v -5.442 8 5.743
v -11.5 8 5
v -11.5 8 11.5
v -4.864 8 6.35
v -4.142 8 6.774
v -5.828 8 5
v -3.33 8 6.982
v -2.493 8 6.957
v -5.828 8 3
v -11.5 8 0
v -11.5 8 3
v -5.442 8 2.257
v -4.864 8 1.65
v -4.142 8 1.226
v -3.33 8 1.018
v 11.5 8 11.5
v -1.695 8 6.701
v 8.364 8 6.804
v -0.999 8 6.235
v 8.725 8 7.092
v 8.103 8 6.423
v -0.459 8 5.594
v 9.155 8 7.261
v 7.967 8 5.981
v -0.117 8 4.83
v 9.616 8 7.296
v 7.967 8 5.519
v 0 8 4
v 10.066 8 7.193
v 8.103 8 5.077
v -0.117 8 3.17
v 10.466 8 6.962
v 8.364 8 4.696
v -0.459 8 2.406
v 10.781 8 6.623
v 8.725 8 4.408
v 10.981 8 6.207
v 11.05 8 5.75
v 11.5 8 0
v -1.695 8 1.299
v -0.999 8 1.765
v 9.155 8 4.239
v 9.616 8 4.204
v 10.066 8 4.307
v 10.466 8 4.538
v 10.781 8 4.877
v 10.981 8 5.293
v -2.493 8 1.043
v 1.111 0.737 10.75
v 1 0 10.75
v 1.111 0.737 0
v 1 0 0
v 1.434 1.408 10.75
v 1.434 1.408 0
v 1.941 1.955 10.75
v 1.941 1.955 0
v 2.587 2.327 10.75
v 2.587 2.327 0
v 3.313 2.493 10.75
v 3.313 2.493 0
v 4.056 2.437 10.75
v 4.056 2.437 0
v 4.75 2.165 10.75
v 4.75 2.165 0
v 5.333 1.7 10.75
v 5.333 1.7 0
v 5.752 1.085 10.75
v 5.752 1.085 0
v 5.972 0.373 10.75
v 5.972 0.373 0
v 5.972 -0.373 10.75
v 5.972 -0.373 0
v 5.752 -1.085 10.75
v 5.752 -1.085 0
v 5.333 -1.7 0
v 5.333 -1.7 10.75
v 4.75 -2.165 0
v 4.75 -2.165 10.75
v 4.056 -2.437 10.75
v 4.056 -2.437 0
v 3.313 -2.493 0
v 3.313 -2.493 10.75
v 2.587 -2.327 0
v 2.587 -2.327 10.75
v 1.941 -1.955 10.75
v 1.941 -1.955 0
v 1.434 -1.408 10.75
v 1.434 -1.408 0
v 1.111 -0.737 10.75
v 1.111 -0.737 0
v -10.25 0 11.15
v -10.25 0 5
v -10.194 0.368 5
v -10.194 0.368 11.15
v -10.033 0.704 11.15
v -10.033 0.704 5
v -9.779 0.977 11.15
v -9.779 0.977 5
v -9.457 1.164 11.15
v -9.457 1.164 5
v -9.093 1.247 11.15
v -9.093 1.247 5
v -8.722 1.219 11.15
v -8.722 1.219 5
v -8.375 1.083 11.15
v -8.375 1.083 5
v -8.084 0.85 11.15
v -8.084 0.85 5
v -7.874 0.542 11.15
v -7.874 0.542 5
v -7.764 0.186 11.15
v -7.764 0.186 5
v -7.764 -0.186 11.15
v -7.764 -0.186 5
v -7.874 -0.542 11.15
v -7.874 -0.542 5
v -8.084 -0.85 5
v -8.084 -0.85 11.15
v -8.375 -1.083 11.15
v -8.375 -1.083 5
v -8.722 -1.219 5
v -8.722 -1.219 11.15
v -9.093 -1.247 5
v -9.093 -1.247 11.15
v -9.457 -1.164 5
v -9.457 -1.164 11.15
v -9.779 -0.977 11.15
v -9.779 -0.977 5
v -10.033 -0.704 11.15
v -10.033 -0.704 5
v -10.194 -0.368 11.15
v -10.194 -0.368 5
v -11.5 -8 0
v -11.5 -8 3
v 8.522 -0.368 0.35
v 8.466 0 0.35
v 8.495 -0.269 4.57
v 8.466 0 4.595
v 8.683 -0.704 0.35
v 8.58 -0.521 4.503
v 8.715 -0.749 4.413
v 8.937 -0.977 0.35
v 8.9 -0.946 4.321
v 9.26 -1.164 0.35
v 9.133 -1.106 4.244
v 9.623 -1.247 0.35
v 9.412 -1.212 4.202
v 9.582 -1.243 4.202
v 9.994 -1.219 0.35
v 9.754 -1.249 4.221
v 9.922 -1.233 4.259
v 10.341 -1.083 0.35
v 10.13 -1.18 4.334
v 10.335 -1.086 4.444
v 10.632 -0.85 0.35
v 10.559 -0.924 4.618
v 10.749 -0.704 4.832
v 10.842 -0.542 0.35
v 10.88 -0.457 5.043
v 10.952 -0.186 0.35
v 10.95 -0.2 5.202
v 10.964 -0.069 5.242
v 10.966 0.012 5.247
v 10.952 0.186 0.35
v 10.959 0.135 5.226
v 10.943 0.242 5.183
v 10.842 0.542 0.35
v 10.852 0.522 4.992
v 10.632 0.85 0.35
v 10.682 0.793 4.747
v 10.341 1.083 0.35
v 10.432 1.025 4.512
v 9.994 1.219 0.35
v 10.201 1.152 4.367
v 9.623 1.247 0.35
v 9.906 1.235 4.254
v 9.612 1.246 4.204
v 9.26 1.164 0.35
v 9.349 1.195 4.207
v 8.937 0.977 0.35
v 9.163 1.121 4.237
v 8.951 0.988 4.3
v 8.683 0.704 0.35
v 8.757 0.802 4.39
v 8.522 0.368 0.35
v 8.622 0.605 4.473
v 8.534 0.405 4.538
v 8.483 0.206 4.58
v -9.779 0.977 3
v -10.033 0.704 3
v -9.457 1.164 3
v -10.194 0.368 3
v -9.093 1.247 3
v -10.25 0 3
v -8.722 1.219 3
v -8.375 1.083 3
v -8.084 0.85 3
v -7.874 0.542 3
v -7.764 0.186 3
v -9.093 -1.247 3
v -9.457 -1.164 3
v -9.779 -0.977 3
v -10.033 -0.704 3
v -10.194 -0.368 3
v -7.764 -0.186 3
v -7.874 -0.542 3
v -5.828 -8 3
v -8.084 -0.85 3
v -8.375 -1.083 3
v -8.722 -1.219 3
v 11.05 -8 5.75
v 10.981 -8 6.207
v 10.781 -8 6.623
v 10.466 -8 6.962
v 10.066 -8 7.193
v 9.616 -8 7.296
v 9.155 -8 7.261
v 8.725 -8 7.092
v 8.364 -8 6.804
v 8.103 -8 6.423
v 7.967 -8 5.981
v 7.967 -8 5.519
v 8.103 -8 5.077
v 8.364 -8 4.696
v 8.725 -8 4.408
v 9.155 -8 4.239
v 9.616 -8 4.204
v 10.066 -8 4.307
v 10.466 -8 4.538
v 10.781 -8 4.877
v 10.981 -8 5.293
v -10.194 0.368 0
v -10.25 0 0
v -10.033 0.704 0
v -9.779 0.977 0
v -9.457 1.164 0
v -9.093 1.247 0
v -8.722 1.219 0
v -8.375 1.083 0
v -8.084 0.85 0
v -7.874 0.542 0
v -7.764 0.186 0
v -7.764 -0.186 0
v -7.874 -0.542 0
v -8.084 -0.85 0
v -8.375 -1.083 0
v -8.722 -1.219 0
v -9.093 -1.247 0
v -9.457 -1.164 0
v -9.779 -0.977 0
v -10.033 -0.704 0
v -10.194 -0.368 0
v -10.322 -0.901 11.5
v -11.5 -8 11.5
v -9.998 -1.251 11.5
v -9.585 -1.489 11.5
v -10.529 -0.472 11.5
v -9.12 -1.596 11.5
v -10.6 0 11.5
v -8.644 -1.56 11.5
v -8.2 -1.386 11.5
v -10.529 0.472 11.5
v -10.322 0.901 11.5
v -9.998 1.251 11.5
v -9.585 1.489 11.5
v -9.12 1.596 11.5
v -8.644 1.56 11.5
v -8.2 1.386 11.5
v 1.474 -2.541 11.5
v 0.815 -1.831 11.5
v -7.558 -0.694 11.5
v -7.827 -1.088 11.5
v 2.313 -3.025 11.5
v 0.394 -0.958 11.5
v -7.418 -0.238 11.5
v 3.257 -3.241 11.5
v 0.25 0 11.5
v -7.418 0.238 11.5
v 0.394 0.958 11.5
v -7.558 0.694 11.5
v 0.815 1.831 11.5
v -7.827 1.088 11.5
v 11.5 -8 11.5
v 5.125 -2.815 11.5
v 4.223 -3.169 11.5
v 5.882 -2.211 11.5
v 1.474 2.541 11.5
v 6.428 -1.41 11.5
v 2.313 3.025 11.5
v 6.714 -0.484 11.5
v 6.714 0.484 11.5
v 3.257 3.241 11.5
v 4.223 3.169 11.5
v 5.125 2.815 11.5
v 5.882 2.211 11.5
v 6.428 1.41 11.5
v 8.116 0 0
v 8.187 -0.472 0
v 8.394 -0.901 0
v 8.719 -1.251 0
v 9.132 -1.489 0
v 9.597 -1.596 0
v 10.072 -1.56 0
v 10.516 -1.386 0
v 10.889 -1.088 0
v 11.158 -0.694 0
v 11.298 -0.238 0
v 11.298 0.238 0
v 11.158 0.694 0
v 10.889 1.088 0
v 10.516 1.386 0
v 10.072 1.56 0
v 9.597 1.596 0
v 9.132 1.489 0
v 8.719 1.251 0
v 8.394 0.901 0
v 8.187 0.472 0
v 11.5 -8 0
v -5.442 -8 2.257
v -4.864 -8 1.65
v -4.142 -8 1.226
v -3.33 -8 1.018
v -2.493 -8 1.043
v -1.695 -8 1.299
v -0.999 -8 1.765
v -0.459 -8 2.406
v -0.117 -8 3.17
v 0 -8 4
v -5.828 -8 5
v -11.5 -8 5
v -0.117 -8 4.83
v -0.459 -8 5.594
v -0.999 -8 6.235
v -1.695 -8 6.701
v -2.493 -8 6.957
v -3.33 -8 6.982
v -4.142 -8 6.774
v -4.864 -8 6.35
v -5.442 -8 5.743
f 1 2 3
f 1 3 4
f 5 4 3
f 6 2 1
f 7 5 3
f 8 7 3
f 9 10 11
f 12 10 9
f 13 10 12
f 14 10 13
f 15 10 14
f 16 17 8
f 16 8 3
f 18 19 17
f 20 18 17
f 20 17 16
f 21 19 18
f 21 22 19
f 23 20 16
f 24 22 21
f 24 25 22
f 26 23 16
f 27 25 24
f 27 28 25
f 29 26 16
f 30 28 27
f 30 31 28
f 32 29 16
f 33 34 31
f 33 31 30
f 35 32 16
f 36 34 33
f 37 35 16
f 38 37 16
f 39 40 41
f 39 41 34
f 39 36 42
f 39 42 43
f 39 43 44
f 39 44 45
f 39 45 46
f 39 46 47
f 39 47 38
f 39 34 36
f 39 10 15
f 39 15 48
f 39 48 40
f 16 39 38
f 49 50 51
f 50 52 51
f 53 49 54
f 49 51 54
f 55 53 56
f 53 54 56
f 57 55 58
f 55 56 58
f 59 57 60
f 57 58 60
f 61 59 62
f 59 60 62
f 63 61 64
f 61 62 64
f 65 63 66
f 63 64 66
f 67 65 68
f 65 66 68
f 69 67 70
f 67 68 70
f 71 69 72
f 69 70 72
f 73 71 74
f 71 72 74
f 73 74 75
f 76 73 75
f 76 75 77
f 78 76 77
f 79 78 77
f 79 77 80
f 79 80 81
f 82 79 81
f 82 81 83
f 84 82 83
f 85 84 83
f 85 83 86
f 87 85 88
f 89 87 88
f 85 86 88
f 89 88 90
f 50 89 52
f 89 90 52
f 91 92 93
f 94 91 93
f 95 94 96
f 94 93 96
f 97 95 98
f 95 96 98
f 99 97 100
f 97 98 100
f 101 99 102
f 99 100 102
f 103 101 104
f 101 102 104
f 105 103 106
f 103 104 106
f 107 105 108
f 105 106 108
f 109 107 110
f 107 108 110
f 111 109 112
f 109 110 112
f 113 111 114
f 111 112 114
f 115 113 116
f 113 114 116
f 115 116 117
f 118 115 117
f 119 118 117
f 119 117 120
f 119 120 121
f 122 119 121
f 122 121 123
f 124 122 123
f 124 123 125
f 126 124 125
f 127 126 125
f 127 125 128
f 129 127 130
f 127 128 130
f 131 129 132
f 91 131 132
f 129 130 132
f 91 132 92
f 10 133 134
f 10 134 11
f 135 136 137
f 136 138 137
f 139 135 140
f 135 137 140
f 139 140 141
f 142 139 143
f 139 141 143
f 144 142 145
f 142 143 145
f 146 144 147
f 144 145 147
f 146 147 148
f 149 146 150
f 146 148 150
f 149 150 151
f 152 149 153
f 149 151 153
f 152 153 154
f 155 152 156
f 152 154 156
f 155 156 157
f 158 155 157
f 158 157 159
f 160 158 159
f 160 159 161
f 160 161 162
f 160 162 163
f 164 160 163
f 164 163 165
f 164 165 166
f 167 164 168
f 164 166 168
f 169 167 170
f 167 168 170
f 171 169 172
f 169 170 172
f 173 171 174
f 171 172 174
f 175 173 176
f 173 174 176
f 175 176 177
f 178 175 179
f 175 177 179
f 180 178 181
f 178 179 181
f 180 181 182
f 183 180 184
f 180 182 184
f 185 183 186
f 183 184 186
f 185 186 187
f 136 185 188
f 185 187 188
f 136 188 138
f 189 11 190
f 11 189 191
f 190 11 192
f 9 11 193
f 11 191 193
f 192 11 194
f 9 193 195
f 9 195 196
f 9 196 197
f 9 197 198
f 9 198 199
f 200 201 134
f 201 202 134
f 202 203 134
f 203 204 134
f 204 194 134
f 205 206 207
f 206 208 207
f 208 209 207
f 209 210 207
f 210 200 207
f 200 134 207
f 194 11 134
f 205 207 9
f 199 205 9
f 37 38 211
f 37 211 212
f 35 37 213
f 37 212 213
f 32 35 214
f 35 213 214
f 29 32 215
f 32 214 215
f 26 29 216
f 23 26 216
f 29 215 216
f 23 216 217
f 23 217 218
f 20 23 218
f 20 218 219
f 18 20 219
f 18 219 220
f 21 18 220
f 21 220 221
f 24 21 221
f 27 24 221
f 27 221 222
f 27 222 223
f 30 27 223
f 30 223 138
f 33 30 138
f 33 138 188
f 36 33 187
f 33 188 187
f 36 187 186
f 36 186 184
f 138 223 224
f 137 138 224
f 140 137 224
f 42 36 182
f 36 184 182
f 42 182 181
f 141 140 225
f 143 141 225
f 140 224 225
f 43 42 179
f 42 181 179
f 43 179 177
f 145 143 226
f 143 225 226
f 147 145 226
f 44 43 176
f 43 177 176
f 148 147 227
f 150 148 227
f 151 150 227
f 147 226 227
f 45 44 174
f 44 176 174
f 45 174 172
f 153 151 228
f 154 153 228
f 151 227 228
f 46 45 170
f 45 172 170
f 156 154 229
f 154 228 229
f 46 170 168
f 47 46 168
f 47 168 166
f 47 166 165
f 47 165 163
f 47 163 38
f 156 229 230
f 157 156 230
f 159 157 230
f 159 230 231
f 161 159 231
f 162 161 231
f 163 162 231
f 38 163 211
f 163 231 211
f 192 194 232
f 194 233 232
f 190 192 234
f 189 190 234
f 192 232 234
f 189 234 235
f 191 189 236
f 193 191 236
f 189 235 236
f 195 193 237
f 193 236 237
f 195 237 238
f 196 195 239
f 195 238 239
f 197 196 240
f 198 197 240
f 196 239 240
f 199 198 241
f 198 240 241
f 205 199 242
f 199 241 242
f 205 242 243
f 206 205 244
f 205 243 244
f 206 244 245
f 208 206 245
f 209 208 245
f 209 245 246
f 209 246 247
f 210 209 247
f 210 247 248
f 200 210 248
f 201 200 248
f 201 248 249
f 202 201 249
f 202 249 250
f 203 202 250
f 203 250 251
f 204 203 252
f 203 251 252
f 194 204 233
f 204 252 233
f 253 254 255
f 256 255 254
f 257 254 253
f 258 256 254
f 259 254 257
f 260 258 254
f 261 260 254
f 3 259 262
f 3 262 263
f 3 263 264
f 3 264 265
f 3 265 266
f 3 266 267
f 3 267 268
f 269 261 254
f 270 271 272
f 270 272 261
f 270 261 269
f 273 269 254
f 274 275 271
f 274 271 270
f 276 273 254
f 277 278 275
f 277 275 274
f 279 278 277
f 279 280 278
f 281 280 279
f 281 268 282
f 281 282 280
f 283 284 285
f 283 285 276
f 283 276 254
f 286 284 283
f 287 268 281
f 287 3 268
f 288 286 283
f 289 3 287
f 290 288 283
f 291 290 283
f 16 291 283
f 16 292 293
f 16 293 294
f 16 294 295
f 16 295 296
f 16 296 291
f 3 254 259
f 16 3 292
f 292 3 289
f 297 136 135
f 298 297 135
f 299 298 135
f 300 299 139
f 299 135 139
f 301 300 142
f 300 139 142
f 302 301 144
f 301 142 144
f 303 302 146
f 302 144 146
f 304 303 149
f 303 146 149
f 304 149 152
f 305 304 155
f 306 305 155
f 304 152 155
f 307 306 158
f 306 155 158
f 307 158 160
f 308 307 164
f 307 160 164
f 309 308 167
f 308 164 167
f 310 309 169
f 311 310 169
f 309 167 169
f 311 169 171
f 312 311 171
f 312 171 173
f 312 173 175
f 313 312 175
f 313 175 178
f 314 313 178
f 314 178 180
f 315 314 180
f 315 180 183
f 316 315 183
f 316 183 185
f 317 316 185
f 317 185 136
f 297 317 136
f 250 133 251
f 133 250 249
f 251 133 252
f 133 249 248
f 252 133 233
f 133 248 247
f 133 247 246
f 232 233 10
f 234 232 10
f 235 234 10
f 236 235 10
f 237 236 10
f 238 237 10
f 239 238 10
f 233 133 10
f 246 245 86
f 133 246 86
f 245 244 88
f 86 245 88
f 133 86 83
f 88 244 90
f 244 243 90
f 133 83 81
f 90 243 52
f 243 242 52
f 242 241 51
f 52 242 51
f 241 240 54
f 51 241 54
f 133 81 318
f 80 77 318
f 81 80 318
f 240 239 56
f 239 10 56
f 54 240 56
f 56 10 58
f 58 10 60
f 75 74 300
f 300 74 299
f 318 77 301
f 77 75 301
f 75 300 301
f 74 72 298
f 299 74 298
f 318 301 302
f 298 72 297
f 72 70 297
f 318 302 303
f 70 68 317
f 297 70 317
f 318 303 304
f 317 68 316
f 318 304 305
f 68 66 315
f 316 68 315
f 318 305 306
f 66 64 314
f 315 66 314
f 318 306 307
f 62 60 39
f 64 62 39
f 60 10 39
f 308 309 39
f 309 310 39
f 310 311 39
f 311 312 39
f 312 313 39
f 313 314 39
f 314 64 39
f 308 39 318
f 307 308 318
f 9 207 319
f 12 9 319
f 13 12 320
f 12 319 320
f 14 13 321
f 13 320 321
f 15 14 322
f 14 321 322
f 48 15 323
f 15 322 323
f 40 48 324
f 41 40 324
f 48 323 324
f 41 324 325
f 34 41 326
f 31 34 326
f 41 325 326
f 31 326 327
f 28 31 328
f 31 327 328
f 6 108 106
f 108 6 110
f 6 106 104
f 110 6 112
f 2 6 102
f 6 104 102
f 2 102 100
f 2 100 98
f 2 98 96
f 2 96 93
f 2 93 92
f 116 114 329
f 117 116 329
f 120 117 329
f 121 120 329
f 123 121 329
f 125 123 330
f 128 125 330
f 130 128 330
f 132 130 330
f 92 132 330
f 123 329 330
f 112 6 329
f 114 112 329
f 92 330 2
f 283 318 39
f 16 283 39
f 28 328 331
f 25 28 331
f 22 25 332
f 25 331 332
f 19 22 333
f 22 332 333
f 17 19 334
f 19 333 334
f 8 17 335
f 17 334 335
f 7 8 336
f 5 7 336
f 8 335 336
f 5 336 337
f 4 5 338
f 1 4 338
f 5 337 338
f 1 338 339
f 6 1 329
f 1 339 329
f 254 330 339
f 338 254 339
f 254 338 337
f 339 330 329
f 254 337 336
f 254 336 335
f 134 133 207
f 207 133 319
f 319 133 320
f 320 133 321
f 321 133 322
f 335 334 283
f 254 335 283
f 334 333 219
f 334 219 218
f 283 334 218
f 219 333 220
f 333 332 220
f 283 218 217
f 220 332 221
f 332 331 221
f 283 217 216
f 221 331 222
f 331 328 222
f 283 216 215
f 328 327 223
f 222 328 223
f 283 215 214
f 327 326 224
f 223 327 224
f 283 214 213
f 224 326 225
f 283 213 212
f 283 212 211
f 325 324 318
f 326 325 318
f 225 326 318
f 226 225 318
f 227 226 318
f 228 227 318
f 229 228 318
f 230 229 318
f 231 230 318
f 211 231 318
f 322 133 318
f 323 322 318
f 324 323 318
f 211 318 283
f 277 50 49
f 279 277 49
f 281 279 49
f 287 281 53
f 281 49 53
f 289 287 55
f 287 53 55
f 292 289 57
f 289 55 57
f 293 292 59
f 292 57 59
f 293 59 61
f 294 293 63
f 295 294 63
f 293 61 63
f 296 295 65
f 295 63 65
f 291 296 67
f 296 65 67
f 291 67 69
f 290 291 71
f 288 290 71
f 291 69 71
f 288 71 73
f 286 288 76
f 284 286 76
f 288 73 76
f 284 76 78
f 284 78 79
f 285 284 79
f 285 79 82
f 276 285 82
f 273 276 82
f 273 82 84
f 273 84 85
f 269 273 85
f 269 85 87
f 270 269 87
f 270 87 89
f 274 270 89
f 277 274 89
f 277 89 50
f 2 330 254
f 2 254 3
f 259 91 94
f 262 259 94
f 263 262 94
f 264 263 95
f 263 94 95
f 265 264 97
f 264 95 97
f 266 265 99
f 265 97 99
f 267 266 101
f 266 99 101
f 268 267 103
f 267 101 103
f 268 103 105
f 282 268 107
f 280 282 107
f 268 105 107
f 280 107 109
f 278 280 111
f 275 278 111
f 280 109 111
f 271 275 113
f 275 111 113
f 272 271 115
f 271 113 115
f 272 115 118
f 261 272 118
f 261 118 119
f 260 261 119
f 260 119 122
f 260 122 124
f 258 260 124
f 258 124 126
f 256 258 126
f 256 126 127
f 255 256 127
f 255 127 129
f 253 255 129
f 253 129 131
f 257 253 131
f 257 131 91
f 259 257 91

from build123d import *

# Parameters (mm, degrees)
F0_W           = 23
F0_H           = 16
F1_DEPTH       = 11.5
F3_D           = 5
F3_CSINK_D     = 6.5
F3_CSINK_ANGLE = 90
F4_D           = 2.5
F4_CSINK_D     = 3.2
F4_CSINK_ANGLE = 90
F5_R           = 1.55
F6_DEPTH       = 16.001
F8_D           = 2.5
F8_DEPTH       = 5.75
F8_CSINK_D     = 3.2
F8_CSINK_ANGLE = 90
F8_TIP         = 0.7510757738


with BuildPart() as f1:
    # F0 (on Top) → F1 (new body)
    with BuildSketch(Plane.XY):
        Rectangle(F0_W, F0_H)
    extrude(amount=F1_DEPTH)

    # F3 (through all)
    with Locations(Plane.XY.offset(11.5)):
        with Locations((3.5, 0)):
            CounterSinkHole(F3_D / 2, F3_CSINK_D / 2, counter_sink_angle=F3_CSINK_ANGLE)

    # F4 (through all)
    with Locations(Plane.XY.offset(11.5)):
        with Locations((-9, 0)):
            CounterSinkHole(F4_D / 2, F4_CSINK_D / 2, counter_sink_angle=F4_CSINK_ANGLE)

    # F5 (on face) → F6 (cut, through all)
    with BuildSketch(Plane.XZ.offset(8)):
        with BuildLine():
            Line((-4.589129705, 5), (-5.8284271247, 5))
            ThreePointArc((-5.8284271247, 5), (-6, 4), (-5.8284271247, 3))
            Line((-5.8284271247, 3), (-4.589129705, 3))
            Line((-4.589129705, 3), (-4.589129705, 5))
        make_face()
        with BuildLine():
            ThreePointArc((-5.8284271247, 3), (-2.4926940638, 1.043204321), (0, 4))
            ThreePointArc((0, 4), (-2.4926940638, 6.956795679), (-5.8284271247, 5))
            Line((-5.8284271247, 5), (-4.589129705, 5))
            Line((-4.589129705, 5), (-4.589129705, 3))
            Line((-4.589129705, 3), (-5.8284271247, 3))
        make_face()
        with Locations((9.5, 5.75)):
            Circle(F5_R)
        with BuildLine():
            ThreePointArc((-5.8284271247, 3), (-6, 4), (-5.8284271247, 5))
            Line((-5.8284271247, 5), (-11.5, 5))
            Line((-11.5, 5), (-11.5, 3))
            Line((-11.5, 3), (-5.8284271247, 3))
        make_face()
    extrude(amount=-F6_DEPTH, mode=Mode.SUBTRACT)

    # F8
    with Locations(Plane(origin=(0, 0, 0), x_dir=(1, 0, 0), z_dir=(0, 0, -1))):
        with Locations((9.7161801532, 0)):
            CounterSinkHole(F8_D / 2, F8_CSINK_D / 2, depth=F8_DEPTH, counter_sink_angle=F8_CSINK_ANGLE)
            with Locations((0, 0, -(F8_DEPTH + F8_TIP / 2))):  # 118° drill point
                Cone(0, F8_D / 2, F8_TIP, mode=Mode.SUBTRACT)


solid = f1.part
